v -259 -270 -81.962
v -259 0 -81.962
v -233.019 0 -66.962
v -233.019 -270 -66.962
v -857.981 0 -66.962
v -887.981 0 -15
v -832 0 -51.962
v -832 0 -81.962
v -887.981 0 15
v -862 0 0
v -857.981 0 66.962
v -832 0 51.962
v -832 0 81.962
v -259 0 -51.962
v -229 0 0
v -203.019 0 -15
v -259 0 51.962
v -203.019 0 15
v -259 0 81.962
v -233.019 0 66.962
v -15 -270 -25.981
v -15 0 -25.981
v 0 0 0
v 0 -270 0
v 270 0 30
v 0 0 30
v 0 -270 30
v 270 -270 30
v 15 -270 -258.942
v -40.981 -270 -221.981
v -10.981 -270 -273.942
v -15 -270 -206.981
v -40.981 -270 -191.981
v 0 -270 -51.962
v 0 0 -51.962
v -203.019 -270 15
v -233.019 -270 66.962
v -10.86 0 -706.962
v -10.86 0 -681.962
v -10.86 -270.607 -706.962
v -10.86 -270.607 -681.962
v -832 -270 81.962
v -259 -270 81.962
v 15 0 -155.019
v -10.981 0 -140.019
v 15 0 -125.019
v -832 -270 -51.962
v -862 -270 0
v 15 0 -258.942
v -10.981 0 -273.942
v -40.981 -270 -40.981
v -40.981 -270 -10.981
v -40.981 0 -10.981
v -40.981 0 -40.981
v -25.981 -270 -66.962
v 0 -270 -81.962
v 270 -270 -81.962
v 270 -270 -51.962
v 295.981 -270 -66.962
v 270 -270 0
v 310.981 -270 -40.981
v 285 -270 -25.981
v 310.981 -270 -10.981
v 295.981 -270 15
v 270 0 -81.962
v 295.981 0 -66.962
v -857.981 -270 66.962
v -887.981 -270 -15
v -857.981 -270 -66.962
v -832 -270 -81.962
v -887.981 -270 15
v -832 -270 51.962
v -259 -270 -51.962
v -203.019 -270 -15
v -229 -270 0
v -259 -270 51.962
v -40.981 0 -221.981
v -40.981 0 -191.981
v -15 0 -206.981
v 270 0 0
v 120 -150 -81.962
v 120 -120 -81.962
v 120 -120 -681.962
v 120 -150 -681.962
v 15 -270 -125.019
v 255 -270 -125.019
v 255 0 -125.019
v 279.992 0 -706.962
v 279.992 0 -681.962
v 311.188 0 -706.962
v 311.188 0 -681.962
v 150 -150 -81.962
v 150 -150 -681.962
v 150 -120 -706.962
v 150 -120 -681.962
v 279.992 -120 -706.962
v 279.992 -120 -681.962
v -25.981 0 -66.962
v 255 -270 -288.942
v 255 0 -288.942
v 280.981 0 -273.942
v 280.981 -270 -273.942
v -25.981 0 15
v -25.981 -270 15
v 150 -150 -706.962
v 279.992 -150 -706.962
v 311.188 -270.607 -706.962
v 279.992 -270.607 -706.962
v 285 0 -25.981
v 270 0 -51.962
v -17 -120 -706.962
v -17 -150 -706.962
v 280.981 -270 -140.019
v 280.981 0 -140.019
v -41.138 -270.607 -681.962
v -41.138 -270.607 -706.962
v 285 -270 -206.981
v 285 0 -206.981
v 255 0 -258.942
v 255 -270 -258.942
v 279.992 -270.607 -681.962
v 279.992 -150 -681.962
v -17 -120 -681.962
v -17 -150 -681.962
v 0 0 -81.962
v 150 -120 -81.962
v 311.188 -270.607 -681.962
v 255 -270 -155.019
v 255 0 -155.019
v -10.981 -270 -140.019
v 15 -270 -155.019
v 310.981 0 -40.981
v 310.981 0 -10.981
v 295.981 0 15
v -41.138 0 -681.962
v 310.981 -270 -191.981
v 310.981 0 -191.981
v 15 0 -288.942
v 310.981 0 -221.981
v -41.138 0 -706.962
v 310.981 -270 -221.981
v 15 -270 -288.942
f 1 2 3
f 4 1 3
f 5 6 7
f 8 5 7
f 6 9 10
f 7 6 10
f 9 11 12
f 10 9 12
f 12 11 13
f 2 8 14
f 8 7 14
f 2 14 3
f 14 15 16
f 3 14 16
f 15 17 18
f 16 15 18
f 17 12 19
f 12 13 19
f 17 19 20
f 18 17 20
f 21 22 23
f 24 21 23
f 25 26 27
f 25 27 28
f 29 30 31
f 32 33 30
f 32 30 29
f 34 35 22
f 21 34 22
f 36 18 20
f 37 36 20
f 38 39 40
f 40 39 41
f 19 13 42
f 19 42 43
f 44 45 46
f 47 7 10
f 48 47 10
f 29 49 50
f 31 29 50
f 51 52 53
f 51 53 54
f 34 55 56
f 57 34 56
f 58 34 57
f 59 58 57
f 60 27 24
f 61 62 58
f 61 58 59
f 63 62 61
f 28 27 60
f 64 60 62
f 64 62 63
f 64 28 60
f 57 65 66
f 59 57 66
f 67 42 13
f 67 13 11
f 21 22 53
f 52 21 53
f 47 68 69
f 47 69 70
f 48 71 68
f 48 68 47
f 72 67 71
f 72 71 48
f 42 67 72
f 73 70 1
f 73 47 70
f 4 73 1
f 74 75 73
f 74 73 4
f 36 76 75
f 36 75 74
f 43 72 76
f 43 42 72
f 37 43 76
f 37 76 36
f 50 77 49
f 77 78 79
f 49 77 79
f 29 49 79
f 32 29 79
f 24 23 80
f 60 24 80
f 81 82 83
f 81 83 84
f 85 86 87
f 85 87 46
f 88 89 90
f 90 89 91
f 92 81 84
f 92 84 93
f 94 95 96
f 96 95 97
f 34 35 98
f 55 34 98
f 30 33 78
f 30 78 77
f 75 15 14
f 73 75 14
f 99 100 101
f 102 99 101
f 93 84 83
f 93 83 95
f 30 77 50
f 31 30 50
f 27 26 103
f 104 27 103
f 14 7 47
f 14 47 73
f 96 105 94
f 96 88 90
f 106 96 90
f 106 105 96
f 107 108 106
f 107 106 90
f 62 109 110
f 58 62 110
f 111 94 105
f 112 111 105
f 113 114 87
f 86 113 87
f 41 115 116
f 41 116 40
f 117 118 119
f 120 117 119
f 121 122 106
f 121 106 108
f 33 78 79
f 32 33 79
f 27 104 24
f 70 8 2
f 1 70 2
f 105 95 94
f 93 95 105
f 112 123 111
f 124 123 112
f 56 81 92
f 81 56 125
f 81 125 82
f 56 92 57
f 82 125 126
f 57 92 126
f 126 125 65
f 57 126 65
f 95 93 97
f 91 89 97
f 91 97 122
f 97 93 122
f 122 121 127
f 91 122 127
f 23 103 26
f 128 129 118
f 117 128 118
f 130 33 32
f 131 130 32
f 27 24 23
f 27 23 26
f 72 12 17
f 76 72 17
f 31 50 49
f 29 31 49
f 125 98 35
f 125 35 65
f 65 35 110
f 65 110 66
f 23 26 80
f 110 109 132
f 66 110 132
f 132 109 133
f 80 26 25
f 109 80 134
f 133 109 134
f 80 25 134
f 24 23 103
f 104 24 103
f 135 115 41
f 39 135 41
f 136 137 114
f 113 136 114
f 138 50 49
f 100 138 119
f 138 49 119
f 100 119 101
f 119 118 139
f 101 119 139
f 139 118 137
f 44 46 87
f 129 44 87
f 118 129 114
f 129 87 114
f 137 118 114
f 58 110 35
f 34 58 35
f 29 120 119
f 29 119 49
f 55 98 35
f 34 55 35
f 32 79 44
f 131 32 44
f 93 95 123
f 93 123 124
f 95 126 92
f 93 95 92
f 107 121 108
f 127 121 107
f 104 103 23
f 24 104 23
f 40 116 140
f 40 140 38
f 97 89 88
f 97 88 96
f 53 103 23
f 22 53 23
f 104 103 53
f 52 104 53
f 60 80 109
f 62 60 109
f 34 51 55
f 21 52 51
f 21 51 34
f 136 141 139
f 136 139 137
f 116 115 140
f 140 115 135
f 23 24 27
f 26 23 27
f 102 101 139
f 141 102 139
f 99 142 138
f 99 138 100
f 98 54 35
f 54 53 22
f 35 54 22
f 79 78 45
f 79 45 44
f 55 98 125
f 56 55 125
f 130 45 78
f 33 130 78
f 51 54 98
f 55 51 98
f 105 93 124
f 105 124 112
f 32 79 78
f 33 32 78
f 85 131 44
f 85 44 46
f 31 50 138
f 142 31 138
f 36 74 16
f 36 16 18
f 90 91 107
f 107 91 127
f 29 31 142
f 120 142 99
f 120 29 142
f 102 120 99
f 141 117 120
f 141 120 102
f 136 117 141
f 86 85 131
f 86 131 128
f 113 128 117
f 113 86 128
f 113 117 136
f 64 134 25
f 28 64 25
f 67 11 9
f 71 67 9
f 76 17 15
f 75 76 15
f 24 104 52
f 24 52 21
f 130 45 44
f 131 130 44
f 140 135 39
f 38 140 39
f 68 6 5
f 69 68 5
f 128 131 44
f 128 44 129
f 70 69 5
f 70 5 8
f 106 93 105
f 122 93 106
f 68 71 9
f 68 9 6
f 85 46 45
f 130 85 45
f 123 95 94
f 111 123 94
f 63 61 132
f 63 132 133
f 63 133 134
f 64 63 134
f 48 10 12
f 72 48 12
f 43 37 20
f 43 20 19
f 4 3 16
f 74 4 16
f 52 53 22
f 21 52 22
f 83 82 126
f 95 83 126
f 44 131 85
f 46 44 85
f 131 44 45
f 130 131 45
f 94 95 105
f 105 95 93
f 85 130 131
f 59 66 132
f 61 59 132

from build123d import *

# Parameters (mm, degrees)
F0_W      = 30
F0_H      = 15
F0_W_2    = 270
F0_H_2    = 30
F2_DEPTH  = 270
F3_W      = 30
F3_H      = 30
F4_DEPTH  = 600
F5_W      = 30.2779739723
F5_H      = 30
F5_H_2    = 120.6070542336
F5_H_3    = 120
F6_DEPTH  = 25
F5_W_2    = 129.9923121929
F5_W_3    = 31.1954915524
F7_DEPTH  = 167
F8_DEPTH  = 270
F0_W_3    = 120
F9_DEPTH  = 270
F0_W_4    = 573.0000723706
F10_DEPTH = 270


with BuildPart() as f2:
    # F0 (on Front) → F2 (new body)
    with BuildSketch(Plane.XZ):
        Polygon((270, -81.9615242271), (295.9807621135, -66.9615242271), (270, -51.9615242271), align=None)
        Polygon((270, 0), (295.9807621135, 15), (270, 30), align=None)
        Polygon((150, -81.9615242271), (270, -81.9615242271), (270, -51.9615242271), (240, -51.9615242271), (210, -51.9615242271), (180, -51.9615242271), (150, -51.9615242271), (150, -66.9615242271), align=None)
        with Locations((135, -59.4615242271)):
            Rectangle(F0_W, F0_H)
        Polygon((285, -25.9807621135), (310.9807621135, -40.9807621135), (310.9807621135, -10.9807621135), align=None)
        Polygon((0, -81.9615242271), (120, -81.9615242271), (120, -66.9615242271), (120, -51.9615242271), (90, -51.9615242271), (60, -51.9615242271), (30, -51.9615242271), (0, -51.9615242271), align=None)
        Polygon((135, -81.9615242271), (150, -81.9615242271), (150, -66.9615242271), (120, -66.9615242271), (120, -81.9615242271), align=None)
        Polygon((270, -51.9615242271), (295.9807621135, -66.9615242271), (310.9807621135, -40.9807621135), (285, -25.9807621135), align=None)
        Polygon((-25.9807621135, -66.9615242271), (0, -81.9615242271), (0, -51.9615242271), align=None)
        Polygon((285, -25.9807621135), (310.9807621135, -10.9807621135), (295.9807621135, 15), (270, 0), align=None)
        with Locations((135, 15)):
            Rectangle(F0_W_2, F0_H_2)
    extrude(amount=F2_DEPTH)

    # F3 (on face) → F4 (join)
    with BuildSketch(Plane(origin=(0, 0, -81.9615242271), x_dir=(1, 0, 0), z_dir=(0, 0, -1))):
        with Locations((135, 135)):
            Rectangle(F3_W, F3_H)
    extrude(amount=F4_DEPTH)


with BuildPart() as f2b:
    # F0 (on Front) → F2, piece 2 (new body)
    with BuildSketch(Plane.XZ):
        Polygon((-10.9807621135, -273.9422689571), (15, -258.9422689571), (-15, -206.98074473), (-40.9807621135, -221.98074473), align=None)
        Polygon((-40.9807621135, -221.98074473), (-15, -206.98074473), (-40.9807621135, -191.98074473), align=None)
    extrude(amount=F2_DEPTH)


with BuildPart() as f2c:
    # F0 (on Front) → F2, piece 3 (new body)
    with BuildSketch(Plane.XZ):
        Polygon((-15, -25.9807621135), (0, 0), (-25.9807621135, 15), (-40.9807621135, -10.9807621135), align=None)
    extrude(amount=F2_DEPTH)


with BuildPart() as f2d:
    # F0 (on Front) → F2, piece 4 (new body)
    with BuildSketch(Plane.XZ):
        Polygon((15, -155.019220503), (15, -125.019220503), (-10.9807621135, -140.019220503), align=None)
    extrude(amount=F2_DEPTH)


with BuildPart() as f6:
    # F5 (on face) → F6 (new body)
    with BuildSketch(Plane(origin=(0, 0, -681.9615242271), x_dir=(1, 0, 0), z_dir=(0, 0, -1))):
        with Locations((-25.9986934252, 135)):
            Rectangle(F5_W, F5_H)
        with Locations((-25.9986934252, 210.3035271168)):
            Rectangle(F5_W, F5_H_2)
        with Locations((-25.9986934252, 60)):
            Rectangle(F5_W, F5_H_3)
    extrude(amount=F6_DEPTH)


with BuildPart() as f6b:
    # F5 (on face) → F6, piece 2 (new body)
    with BuildSketch(Plane(origin=(0, 0, -681.9615242271), x_dir=(1, 0, 0), z_dir=(0, 0, -1))):
        with Locations((214.9961560965, 135)):
            Rectangle(F5_W_2, F5_H)
        with Locations((295.5900579691, 210.3035271168)):
            Rectangle(F5_W_3, F5_H_2)
        with Locations((295.5900579691, 135)):
            Rectangle(F5_W_3, F5_H)
        with Locations((295.5900579691, 60)):
            Rectangle(F5_W_3, F5_H_3)
    extrude(amount=F6_DEPTH)


with BuildPart() as f7:
    # F7 (new): a face of the model
    f7_faces = [f6b.part.faces().sort_by_distance(p)[0] for p in [
        (150, -135, -694.4615242271),
    ]]
    extrude(f7_faces, amount=F7_DEPTH)


with BuildPart() as f8:
    # F0 (on Front) → F8 (new body)
    with BuildSketch(Plane.XZ):
        Polygon((-25.9807621135, 15), (0, 0), (0, 30), align=None)
    extrude(amount=F8_DEPTH)


with BuildPart() as f8b:
    # F0 (on Front) → F8, piece 2 (new body)
    with BuildSketch(Plane.XZ):
        Polygon((-40.9807621135, -40.9807621135), (-15, -25.9807621135), (-40.9807621135, -10.9807621135), align=None)
        Polygon((0, -51.9615242271), (-15, -25.9807621135), (-40.9807621135, -40.9807621135), (-25.9807621135, -66.9615242271), align=None)
    extrude(amount=F8_DEPTH)


with BuildPart() as f9:
    # F0 (on Front) → F9 (new body)
    with BuildSketch(Plane.XZ):
        with Locations((75, -140.019220503)):
            Rectangle(F0_W_3, F0_H_2)
        with Locations((195, -140.019220503)):
            Rectangle(F0_W_3, F0_H_2)
        Polygon((280.9807621135, -140.019220503), (255, -125.019220503), (255, -155.019220503), align=None)
        Polygon((280.9807621135, -140.019220503), (255, -155.019220503), (285, -206.98074473), (310.9807621135, -191.98074473), align=None)
        Polygon((285, -206.98074473), (255, -258.9422689571), (280.9807621135, -273.9422689571), (310.9807621135, -221.98074473), align=None)
        with Locations((195, -273.9422689571)):
            Rectangle(F0_W_3, F0_H_2)
        with Locations((75, -273.9422689571)):
            Rectangle(F0_W_3, F0_H_2)
        Polygon((15, -288.9422689571), (15, -258.9422689571), (-10.9807621135, -273.9422689571), align=None)
        Polygon((280.9807621135, -273.9422689571), (255, -258.9422689571), (255, -288.9422689571), align=None)
        Polygon((310.9807621135, -191.98074473), (285, -206.98074473), (310.9807621135, -221.98074473), align=None)
    extrude(amount=F9_DEPTH)


with BuildPart() as f9b:
    # F0 (on Front) → F9, piece 2 (new body)
    with BuildSketch(Plane.XZ):
        Polygon((-15, -206.98074473), (15, -155.019220503), (-10.9807621135, -140.019220503), (-40.9807621135, -191.98074473), align=None)
    extrude(amount=F9_DEPTH)


with BuildPart() as f10:
    # F0 (on Front) → F10 (new body)
    with BuildSketch(Plane.XZ):
        Polygon((-887.9806089401, 15), (-887.9806089401, -15), (-861.9998468266, 0), align=None)
        Polygon((-831.9998468266, 81.9615242271), (-857.9806089401, 66.9615242271), (-831.9998468266, 51.9615242271), align=None)
        Polygon((-831.9998468266, -51.9615242271), (-857.9806089401, -66.9615242271), (-831.9998468266, -81.9615242271), align=None)
        Polygon((-258.999774456, 81.9615242271), (-258.999774456, 51.9615242271), (-233.0190123425, 66.9615242271), align=None)
        Polygon((-258.999774456, -51.9615242271), (-258.999774456, -81.9615242271), (-233.0190123425, -66.9615242271), align=None)
        Polygon((-203.0190123425, 15), (-228.999774456, 0), (-203.0190123425, -15), align=None)
        Polygon((-887.9806089401, -15), (-857.9806089401, -66.9615242271), (-831.9998468266, -51.9615242271), (-861.9998468266, 0), align=None)
        Polygon((-857.9806089401, 66.9615242271), (-887.9806089401, 15), (-861.9998468266, 0), (-831.9998468266, 51.9615242271), align=None)
        with Locations((-545.4998106413, -66.9615242271)):
            Rectangle(F0_W_4, F0_H_2)
        Polygon((-228.999774456, 0), (-258.999774456, -51.9615242271), (-233.0190123425, -66.9615242271), (-203.0190123425, -15), align=None)
        Polygon((-258.999774456, 51.9615242271), (-228.999774456, 0), (-203.0190123425, 15), (-233.0190123425, 66.9615242271), align=None)
        with Locations((-545.4998106413, 66.9615242271)):
            Rectangle(F0_W_4, F0_H_2)
    extrude(amount=F10_DEPTH)


solid = Compound([f2.part, f2b.part, f2c.part, f2d.part, f6.part, f6b.part, f7.part, f8.part, f8b.part, f9.part, f9b.part, f10.part])
